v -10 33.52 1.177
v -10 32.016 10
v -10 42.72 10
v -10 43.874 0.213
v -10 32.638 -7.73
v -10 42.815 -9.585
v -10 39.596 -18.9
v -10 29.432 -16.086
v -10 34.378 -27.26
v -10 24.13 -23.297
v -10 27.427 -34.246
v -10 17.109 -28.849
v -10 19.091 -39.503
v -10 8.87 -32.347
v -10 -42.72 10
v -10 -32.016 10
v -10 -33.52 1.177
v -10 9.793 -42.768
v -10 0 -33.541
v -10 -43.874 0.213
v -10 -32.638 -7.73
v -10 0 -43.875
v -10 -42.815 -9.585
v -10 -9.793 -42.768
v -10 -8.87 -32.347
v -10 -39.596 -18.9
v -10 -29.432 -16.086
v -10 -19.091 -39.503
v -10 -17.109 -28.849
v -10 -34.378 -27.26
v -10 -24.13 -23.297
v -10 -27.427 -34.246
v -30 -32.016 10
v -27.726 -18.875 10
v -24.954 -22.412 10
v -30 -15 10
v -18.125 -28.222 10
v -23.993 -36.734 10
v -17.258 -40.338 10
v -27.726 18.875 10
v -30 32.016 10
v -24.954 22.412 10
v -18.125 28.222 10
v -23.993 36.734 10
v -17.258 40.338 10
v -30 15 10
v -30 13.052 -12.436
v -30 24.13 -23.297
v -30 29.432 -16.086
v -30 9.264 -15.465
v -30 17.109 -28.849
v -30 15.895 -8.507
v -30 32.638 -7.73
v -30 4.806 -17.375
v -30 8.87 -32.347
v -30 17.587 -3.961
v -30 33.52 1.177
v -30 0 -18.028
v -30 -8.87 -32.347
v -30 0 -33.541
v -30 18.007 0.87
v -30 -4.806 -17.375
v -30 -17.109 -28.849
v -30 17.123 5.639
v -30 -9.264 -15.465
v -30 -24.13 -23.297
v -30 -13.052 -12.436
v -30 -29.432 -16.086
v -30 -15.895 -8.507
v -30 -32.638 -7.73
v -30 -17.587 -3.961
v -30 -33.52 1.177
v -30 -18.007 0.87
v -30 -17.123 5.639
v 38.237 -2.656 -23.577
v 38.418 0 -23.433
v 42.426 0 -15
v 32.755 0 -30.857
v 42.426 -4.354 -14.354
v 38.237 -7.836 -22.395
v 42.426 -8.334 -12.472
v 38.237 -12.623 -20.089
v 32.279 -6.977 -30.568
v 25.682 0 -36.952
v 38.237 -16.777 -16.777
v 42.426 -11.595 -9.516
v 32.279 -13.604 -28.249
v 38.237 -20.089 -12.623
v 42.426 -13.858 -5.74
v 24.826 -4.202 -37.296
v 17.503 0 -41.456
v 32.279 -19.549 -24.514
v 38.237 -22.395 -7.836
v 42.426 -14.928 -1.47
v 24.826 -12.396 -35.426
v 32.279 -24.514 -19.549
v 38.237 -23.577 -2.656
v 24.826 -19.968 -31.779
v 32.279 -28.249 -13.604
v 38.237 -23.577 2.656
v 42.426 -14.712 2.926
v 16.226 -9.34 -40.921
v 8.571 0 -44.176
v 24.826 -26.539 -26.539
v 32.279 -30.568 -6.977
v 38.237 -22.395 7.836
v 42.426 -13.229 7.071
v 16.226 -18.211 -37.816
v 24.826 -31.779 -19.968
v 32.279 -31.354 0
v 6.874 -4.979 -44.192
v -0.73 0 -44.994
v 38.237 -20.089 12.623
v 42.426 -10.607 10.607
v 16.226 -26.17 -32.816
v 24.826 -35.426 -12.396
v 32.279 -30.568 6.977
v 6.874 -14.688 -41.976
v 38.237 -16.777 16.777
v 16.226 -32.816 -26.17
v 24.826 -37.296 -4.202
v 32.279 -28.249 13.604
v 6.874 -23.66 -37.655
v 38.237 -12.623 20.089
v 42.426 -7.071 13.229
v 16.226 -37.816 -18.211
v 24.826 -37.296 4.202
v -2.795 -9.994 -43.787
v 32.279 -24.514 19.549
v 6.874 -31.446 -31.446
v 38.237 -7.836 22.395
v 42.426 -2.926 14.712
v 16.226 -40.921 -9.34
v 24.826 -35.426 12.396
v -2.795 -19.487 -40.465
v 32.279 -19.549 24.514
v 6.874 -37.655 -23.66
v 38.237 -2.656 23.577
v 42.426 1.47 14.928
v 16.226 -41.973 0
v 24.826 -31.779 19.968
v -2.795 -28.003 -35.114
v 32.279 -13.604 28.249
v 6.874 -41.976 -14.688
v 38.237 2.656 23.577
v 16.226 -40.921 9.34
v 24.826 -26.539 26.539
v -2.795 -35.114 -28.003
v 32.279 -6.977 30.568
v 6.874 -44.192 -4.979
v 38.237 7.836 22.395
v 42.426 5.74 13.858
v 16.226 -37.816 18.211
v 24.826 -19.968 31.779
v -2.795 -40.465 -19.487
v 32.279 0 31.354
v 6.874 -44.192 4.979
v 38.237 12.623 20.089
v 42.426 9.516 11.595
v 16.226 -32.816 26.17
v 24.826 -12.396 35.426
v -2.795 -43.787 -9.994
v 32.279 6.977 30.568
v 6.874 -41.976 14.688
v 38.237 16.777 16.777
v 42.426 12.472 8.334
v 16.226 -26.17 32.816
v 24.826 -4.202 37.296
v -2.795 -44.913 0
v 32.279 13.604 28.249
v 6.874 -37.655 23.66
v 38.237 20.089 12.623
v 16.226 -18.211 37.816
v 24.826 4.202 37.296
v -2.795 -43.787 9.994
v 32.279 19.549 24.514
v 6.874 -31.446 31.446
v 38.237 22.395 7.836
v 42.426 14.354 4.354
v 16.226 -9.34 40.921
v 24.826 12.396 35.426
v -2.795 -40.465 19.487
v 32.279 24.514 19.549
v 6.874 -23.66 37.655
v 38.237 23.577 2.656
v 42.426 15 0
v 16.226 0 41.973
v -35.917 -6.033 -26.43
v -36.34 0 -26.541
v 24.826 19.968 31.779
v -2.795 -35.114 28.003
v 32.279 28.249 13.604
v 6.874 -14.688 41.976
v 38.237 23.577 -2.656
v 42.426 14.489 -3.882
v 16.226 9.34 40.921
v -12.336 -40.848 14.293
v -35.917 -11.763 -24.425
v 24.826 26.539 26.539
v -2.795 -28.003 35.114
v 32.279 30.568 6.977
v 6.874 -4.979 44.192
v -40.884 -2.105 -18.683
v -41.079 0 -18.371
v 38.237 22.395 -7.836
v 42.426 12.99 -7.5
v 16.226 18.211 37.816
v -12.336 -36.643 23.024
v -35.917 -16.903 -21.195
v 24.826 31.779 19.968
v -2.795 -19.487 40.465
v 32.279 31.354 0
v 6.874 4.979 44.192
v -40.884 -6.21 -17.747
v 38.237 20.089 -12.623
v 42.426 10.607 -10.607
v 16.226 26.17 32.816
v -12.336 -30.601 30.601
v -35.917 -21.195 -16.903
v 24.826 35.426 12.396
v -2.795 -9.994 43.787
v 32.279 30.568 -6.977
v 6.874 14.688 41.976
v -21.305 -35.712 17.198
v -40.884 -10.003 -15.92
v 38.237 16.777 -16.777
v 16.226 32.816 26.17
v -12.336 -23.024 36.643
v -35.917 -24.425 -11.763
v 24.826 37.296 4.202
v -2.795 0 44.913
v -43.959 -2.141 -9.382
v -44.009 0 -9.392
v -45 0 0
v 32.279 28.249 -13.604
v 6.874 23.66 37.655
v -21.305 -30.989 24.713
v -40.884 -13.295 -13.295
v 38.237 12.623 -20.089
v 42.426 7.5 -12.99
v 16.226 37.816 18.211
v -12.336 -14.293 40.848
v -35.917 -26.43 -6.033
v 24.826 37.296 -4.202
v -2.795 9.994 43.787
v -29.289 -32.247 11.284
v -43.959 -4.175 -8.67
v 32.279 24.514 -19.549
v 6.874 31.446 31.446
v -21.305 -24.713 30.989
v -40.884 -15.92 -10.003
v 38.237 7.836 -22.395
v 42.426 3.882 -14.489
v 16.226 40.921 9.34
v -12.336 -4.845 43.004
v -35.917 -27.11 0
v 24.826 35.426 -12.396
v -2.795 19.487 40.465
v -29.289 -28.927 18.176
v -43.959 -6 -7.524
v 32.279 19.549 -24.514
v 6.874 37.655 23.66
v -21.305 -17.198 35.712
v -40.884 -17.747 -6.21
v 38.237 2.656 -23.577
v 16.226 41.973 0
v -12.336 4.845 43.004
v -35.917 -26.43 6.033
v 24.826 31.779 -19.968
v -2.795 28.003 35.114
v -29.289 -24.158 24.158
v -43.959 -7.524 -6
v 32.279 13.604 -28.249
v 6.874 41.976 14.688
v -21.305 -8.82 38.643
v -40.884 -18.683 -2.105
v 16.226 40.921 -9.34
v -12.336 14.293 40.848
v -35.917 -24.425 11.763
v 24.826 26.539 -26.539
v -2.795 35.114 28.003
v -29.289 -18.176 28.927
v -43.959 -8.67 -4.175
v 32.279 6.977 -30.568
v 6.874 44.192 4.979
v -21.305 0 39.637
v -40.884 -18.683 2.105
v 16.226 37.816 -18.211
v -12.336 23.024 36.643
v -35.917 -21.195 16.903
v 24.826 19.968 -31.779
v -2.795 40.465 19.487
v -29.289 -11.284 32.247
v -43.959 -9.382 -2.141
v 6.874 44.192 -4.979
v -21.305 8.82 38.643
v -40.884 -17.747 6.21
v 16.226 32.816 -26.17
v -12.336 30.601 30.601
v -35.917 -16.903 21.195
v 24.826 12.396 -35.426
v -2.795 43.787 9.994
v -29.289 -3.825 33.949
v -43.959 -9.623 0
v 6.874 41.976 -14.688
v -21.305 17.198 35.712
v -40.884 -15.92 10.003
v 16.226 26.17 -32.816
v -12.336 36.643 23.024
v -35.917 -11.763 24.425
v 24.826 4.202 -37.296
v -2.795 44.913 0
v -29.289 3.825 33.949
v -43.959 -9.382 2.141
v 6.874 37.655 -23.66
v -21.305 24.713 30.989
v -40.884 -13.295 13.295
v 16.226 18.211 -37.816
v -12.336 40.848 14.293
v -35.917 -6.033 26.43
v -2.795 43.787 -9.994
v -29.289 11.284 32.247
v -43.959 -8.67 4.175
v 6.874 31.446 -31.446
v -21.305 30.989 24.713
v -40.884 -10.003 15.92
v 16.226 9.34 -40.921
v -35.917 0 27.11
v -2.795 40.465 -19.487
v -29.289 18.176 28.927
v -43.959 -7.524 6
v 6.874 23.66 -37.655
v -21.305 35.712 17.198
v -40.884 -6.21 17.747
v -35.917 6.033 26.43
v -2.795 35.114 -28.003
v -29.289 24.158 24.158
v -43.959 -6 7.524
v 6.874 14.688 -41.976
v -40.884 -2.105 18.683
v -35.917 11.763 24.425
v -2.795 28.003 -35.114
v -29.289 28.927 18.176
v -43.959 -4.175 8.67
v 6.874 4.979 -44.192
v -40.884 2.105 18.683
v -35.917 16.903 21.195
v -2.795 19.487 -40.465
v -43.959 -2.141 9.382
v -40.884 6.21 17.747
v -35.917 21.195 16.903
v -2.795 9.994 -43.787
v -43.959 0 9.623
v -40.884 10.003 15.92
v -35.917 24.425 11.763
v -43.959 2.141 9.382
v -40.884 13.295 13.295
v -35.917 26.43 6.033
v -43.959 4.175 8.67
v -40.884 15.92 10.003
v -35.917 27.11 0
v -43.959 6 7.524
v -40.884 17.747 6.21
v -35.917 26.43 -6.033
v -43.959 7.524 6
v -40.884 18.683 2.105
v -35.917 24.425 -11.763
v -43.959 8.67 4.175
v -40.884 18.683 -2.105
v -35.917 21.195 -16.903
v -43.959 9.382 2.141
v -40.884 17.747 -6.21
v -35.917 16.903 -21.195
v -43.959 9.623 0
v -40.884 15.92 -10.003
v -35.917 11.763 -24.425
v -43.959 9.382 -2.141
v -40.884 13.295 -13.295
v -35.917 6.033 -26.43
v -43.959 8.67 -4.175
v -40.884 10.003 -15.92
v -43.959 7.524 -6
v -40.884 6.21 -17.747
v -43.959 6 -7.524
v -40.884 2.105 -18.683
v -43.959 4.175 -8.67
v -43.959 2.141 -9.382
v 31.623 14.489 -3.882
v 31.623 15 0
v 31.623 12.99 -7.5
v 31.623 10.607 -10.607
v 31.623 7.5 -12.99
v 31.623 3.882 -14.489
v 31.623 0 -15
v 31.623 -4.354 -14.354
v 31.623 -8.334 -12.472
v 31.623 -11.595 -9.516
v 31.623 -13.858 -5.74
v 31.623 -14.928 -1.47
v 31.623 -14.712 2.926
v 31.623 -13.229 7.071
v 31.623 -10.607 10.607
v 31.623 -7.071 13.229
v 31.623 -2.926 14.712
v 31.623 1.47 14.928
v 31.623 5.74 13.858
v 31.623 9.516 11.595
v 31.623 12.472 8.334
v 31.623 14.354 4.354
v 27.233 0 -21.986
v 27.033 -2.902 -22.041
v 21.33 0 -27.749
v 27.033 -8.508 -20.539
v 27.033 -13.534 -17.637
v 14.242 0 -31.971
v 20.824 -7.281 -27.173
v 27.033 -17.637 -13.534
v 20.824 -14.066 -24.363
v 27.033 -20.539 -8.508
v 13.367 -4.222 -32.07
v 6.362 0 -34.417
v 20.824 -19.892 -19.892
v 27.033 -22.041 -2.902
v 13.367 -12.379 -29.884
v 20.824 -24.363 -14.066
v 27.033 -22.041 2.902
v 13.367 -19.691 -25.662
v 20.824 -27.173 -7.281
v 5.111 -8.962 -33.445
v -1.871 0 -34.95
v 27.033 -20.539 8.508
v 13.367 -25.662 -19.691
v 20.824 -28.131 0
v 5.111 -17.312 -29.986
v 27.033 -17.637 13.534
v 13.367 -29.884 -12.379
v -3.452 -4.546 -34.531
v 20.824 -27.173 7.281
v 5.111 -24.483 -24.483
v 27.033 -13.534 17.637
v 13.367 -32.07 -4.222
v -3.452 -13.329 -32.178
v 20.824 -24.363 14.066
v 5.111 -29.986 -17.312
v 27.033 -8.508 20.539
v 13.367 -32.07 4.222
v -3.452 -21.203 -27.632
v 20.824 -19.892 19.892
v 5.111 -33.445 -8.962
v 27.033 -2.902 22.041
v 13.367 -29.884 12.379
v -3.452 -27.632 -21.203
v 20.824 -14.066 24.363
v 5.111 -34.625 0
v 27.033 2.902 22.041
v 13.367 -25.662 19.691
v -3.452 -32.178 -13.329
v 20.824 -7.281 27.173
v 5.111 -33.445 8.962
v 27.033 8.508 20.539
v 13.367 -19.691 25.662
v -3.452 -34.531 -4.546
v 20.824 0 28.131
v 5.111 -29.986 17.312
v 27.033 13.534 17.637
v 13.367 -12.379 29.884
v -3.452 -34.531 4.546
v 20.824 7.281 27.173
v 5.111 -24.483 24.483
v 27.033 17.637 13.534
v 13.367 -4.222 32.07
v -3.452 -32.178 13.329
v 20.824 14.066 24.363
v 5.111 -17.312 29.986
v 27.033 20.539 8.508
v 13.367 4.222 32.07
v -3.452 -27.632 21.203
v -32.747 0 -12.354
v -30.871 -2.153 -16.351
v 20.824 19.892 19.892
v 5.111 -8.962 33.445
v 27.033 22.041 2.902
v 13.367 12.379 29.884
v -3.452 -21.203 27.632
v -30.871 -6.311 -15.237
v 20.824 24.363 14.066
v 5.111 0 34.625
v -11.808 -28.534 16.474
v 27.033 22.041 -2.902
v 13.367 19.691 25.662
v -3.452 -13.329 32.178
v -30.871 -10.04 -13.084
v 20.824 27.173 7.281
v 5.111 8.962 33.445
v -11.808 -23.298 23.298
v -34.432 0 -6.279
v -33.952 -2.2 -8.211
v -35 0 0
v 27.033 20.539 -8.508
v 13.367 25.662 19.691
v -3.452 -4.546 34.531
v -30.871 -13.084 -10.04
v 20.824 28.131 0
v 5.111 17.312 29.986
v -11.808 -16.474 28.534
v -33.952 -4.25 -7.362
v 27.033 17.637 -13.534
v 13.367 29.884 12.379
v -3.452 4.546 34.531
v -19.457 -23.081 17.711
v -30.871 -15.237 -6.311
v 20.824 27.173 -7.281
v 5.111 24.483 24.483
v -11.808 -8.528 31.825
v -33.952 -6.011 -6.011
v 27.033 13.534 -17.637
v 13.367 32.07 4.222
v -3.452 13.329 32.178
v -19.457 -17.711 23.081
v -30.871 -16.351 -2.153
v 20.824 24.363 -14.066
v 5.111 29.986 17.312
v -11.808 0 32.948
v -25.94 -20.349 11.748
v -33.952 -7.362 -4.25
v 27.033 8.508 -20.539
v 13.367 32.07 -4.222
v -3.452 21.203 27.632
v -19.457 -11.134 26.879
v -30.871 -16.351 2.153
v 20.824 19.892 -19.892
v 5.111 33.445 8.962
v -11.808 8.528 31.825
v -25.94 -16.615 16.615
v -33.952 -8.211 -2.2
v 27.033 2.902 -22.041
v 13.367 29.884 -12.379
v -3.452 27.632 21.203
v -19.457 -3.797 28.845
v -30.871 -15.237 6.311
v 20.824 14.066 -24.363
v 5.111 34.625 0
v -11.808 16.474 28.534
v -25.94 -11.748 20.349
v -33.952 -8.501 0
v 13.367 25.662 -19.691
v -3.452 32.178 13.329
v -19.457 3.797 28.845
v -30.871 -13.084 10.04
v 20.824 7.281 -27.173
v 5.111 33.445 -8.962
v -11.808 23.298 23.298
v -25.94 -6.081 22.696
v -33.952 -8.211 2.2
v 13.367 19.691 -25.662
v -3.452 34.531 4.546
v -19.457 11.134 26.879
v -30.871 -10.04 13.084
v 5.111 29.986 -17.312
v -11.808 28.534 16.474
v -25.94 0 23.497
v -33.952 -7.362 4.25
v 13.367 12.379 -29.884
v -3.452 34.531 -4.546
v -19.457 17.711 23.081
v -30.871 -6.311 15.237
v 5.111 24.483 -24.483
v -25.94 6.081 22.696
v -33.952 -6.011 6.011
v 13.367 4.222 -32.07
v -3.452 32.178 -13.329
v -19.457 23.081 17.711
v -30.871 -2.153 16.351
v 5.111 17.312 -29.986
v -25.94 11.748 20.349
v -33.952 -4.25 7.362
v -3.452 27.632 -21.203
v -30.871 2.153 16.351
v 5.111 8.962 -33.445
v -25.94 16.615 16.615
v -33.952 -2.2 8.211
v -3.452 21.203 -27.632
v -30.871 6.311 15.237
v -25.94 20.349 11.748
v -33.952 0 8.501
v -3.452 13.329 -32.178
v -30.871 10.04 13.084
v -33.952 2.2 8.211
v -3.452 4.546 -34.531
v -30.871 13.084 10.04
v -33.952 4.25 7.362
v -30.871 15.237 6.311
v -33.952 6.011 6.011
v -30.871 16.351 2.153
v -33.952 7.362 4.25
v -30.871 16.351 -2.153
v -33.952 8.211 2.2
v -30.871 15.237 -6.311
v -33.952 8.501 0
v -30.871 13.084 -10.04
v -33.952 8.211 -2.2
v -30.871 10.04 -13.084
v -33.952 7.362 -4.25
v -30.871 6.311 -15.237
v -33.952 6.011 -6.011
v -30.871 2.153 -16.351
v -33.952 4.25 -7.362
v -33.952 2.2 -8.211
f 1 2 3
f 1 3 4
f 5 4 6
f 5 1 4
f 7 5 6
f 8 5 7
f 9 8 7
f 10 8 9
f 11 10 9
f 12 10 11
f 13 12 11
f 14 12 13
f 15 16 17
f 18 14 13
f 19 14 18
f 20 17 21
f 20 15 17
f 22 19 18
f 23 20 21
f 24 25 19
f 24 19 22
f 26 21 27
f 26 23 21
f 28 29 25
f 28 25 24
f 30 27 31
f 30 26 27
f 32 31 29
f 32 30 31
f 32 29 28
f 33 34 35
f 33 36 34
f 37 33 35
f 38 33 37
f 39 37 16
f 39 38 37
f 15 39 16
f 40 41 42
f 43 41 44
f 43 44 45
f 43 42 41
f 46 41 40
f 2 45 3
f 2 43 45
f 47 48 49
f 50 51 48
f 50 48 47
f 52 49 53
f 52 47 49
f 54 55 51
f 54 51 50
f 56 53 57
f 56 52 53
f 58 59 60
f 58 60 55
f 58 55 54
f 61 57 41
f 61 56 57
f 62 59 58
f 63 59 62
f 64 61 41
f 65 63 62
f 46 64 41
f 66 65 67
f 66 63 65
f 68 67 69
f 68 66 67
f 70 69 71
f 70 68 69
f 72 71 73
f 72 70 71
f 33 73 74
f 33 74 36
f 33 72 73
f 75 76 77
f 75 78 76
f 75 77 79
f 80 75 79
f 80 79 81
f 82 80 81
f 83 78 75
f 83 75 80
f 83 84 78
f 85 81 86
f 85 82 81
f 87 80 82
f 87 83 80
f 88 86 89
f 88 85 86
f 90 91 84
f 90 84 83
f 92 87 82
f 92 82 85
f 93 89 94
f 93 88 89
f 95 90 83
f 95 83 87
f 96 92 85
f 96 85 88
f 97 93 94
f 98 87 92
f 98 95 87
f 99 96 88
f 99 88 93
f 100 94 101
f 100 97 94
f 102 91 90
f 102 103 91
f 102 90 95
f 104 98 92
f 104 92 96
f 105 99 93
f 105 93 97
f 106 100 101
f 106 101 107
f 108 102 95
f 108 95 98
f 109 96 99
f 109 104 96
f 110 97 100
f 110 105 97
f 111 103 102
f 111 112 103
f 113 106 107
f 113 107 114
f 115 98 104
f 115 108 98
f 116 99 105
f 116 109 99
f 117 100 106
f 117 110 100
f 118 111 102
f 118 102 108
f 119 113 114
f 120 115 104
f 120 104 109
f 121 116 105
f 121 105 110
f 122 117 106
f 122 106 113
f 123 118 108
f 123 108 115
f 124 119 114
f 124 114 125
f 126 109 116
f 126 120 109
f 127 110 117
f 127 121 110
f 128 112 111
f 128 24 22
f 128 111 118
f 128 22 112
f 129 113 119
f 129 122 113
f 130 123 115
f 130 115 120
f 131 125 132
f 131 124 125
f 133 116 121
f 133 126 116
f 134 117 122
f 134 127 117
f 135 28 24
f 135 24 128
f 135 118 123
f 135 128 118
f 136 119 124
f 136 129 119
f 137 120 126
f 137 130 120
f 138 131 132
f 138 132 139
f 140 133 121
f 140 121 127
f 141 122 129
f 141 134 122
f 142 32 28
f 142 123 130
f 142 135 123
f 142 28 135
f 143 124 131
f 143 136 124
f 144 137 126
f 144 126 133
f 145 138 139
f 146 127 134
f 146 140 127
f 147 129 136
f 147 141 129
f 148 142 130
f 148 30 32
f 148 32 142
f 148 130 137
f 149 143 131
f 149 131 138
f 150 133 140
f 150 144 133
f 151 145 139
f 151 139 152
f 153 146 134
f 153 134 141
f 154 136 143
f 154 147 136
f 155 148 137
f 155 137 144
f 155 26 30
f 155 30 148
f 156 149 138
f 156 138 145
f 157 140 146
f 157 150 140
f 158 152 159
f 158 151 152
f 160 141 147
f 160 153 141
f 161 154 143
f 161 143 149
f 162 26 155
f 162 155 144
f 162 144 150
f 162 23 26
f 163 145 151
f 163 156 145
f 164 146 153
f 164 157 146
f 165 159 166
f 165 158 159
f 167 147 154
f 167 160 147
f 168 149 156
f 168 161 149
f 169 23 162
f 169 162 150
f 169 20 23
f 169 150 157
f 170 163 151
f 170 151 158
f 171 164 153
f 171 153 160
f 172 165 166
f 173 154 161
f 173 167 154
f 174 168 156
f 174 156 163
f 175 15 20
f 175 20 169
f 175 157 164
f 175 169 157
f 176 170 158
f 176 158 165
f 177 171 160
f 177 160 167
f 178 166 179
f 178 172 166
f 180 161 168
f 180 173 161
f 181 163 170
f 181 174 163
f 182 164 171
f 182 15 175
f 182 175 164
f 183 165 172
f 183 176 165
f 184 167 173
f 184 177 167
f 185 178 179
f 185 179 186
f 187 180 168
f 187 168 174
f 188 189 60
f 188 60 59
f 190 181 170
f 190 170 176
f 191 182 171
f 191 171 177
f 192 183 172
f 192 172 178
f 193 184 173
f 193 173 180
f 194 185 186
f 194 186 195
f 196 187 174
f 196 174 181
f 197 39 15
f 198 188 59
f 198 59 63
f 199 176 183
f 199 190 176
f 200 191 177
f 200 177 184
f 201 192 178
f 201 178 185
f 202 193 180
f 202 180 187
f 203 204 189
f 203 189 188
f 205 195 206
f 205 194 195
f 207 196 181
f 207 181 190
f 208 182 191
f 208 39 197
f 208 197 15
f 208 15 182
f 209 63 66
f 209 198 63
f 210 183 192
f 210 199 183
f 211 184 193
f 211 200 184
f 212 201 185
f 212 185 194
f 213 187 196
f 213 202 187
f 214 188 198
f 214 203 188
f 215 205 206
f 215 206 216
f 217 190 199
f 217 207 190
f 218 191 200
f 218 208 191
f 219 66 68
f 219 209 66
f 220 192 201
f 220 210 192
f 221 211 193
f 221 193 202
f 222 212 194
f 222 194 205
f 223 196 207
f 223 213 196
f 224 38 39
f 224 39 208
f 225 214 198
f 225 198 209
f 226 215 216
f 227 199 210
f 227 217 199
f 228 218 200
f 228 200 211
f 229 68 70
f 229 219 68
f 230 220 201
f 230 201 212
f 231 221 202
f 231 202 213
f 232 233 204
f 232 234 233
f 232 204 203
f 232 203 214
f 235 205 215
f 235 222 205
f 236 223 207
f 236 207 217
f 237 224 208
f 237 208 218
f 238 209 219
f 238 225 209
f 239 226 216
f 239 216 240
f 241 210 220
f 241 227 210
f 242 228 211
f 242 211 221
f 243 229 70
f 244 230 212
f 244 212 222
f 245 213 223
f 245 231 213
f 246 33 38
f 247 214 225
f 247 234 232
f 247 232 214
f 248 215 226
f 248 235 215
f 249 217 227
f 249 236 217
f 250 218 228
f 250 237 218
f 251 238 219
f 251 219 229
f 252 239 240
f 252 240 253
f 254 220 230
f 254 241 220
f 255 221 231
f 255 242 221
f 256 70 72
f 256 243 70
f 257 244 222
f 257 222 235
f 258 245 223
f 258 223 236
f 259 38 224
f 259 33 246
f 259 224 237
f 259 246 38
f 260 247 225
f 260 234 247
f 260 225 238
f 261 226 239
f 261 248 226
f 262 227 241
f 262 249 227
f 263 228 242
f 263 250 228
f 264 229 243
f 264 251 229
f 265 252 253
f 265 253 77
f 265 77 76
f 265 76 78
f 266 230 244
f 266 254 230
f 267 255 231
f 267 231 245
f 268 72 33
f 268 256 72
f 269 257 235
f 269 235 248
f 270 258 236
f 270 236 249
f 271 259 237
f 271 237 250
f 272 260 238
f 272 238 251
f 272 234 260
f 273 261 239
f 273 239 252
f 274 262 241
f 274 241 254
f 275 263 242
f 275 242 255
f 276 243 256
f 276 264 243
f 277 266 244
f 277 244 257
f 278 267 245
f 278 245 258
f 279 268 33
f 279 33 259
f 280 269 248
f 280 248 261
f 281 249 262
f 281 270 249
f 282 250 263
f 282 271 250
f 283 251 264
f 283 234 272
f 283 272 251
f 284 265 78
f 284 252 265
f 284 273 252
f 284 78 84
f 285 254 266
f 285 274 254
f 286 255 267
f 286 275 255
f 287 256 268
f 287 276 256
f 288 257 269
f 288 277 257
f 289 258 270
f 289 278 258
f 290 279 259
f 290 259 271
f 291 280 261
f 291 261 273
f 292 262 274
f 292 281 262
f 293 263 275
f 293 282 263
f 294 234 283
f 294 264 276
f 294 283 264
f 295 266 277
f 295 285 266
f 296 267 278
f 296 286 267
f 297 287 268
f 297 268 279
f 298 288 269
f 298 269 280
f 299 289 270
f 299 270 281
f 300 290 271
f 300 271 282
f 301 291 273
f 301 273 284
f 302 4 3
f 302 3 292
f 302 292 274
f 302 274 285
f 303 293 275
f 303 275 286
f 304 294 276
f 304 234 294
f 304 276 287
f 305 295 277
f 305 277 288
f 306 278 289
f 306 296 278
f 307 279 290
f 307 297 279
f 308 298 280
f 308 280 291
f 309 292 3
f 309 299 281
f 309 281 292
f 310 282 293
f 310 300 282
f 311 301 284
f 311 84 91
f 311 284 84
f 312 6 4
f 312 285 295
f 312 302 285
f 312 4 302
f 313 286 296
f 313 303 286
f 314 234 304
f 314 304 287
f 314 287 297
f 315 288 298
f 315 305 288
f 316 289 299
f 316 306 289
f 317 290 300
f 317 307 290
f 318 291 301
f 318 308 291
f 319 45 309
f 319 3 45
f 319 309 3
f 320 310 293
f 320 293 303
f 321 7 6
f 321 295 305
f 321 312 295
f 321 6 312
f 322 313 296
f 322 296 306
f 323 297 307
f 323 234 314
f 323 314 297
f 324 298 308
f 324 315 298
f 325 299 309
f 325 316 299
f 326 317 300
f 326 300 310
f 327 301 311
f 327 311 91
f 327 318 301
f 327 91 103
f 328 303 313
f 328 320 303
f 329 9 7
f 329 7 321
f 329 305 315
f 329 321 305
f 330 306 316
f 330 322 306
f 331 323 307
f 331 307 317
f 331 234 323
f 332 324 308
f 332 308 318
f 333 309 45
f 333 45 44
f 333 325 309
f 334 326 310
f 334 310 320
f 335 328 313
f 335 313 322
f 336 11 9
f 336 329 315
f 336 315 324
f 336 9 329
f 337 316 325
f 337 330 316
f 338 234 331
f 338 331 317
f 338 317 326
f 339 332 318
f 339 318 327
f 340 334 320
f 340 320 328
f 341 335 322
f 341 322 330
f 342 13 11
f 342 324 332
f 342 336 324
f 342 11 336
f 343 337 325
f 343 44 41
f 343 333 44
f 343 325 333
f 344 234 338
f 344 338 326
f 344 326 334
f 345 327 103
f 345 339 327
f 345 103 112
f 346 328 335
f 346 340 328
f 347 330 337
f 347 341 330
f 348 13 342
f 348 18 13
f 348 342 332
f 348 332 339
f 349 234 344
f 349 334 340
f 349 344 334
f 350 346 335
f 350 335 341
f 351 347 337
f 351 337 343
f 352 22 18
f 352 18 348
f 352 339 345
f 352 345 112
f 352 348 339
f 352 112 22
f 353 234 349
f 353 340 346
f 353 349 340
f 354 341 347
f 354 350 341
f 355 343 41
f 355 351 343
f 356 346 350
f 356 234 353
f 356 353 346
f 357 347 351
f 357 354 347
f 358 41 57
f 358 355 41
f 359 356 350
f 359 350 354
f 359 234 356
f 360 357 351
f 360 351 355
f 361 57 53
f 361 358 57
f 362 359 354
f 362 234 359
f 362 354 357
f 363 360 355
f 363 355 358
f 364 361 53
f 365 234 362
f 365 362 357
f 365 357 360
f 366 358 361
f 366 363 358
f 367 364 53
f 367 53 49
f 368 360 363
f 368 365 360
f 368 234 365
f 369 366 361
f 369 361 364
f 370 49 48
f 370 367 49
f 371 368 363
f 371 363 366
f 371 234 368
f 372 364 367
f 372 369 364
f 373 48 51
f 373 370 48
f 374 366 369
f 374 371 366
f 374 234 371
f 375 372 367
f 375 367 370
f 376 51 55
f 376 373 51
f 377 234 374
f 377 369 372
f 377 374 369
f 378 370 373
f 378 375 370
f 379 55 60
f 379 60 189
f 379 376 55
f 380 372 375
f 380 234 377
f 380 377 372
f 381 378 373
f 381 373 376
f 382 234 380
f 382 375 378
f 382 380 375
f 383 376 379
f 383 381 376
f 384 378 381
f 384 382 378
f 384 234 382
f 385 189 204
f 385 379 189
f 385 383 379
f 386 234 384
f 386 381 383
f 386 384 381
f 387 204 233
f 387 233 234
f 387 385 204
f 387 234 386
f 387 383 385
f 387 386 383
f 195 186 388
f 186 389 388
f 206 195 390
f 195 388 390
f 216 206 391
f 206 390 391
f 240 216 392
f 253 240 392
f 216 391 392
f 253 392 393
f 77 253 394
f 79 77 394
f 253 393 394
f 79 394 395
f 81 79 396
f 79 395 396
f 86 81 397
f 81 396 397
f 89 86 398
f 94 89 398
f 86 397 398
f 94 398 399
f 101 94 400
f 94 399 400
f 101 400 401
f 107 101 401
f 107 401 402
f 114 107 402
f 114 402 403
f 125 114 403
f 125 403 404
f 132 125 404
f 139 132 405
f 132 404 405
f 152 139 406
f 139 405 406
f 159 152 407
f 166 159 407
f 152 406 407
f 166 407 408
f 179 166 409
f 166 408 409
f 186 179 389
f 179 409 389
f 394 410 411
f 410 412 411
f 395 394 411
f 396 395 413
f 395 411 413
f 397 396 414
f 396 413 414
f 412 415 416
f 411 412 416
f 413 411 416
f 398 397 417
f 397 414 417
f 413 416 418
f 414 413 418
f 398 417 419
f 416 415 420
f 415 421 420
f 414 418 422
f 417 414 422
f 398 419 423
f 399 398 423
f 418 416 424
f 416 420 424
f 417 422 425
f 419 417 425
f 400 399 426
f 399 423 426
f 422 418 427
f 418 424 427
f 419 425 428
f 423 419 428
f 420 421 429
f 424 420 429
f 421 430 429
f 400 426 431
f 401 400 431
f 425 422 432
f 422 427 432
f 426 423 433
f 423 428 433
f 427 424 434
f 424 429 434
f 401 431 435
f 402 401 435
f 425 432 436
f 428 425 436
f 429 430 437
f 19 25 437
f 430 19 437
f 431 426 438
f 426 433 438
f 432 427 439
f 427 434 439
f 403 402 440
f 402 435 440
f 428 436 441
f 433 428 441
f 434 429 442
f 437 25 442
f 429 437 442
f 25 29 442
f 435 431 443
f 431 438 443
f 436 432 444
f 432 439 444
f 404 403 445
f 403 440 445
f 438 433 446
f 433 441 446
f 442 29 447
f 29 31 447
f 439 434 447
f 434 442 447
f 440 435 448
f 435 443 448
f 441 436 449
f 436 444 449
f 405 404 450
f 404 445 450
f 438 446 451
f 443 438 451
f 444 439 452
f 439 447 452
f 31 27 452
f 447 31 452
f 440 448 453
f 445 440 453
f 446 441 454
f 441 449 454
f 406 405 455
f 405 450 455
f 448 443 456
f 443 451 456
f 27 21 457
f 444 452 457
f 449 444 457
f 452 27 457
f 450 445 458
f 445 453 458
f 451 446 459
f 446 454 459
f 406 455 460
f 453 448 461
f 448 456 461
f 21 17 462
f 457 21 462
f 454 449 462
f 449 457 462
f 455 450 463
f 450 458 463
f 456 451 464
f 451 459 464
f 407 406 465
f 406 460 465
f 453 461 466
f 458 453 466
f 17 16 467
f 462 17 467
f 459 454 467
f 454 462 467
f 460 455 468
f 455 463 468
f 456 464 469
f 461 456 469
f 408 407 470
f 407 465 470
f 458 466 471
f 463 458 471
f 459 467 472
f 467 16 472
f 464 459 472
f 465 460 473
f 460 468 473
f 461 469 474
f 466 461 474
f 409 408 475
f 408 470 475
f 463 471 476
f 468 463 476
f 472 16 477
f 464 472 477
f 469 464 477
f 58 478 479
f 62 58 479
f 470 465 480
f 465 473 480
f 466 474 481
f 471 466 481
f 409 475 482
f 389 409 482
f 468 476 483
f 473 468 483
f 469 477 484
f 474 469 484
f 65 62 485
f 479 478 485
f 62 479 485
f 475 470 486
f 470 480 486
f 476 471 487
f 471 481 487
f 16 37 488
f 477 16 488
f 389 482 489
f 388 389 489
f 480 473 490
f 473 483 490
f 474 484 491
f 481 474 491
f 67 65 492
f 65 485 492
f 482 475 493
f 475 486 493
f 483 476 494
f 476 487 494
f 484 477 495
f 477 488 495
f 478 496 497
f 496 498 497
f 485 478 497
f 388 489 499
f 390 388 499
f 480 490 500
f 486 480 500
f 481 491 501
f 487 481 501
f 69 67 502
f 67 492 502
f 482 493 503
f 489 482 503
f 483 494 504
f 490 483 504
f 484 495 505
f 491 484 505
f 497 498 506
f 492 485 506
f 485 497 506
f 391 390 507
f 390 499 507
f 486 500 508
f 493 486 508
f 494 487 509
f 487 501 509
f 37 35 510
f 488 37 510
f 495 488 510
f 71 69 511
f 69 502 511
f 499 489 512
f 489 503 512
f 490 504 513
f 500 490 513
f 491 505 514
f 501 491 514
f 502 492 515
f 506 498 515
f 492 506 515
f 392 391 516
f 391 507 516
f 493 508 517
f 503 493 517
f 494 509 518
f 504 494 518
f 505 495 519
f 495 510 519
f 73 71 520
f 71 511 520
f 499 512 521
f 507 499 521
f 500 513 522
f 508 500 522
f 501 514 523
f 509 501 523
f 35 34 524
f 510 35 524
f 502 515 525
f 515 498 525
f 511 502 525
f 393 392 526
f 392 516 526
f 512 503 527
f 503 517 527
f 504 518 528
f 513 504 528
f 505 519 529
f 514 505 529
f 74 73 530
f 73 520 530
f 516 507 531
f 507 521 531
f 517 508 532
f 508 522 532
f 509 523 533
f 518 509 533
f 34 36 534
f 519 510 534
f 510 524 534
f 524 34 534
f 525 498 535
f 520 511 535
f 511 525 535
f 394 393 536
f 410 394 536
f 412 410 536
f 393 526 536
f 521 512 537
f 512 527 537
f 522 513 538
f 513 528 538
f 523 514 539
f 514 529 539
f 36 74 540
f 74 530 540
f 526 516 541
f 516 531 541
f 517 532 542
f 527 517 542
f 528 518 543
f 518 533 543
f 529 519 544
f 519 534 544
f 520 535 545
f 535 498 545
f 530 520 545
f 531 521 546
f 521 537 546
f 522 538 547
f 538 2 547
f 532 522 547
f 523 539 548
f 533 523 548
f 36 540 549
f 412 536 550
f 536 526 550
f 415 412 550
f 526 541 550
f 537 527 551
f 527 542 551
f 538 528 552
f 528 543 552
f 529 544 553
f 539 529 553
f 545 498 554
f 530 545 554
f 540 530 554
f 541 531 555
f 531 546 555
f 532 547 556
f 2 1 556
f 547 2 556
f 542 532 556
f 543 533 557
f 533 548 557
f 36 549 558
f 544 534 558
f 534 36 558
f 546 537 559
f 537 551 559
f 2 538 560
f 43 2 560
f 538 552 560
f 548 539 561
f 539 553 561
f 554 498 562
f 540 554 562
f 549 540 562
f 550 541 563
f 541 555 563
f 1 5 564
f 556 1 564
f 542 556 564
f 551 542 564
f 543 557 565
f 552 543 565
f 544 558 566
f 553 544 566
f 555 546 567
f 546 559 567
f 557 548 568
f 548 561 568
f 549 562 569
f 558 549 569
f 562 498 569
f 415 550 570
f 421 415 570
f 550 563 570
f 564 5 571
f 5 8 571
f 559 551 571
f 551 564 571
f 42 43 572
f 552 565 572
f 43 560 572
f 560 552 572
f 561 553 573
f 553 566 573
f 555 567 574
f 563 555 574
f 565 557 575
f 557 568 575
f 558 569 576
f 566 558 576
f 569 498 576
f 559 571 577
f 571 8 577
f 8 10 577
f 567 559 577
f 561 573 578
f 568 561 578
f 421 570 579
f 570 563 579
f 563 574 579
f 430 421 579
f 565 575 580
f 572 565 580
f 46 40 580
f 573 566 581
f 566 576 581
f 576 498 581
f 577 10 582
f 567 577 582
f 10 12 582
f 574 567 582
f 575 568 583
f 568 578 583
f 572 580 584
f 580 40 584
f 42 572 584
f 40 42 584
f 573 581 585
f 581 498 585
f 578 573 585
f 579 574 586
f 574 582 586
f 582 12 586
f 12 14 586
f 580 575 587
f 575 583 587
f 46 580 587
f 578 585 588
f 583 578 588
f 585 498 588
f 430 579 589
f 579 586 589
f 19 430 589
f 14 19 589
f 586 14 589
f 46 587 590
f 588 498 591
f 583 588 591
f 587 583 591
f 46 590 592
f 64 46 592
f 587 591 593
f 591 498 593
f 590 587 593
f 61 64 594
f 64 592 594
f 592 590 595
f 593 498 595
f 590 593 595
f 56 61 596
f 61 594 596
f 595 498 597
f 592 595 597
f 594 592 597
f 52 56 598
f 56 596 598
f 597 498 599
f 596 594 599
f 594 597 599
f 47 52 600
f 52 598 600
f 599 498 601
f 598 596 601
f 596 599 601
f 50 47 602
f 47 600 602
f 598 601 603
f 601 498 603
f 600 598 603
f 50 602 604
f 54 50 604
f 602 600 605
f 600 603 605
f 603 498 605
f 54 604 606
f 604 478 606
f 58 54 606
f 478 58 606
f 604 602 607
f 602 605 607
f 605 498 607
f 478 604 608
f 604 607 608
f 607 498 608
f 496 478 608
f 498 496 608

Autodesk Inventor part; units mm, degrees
ref_plane "YZ Plane" through (0, 0, 0) normal (1, 0, 0) x (0, 1, 0)
ref_plane "XZ Plane" through (0, 0, 0) normal (0, 1, 0) x (-1, 0, 0)
ref_plane "XY Plane" through (0, 0, 0) normal (0, 0, 1) x (1, 0, 0)
sketch "Эскиз1" plane through (0, 0, 0) normal (0, 1, 0) x (-1, 0, 0)
  arc A0 (-45, 0) -> (45, 0) centre (0, 0) ccw
  arc A1 (-35, 0) -> (35, 0) centre (0, 0) ccw
  line L0 (45, 0) -> (35, 0)
  line L1 (-35, 0) -> (-45, 0)
  line L2 (63, 0) -> (-63, 0) projected
  dimension "d0" = 45
  dimension "d1" = 35
revolve "Вращение1" add sketch "Эскиз1" angle 360 about axis through (-10, 0, 0) along (1, 0, 0) contours L1 A1 L0 A0
sketch "Эскиз2" plane through (0, 0, 0) normal (0, 1, 0) x (-1, 0, 0)
  line L0 (30, 10) -> (10, 10)
  line L1 (10, 10) -> (10, -45)
  line L2 (10, -45) -> (30, -45)
  line L3 (30, -45) -> (30, 10)
  line L4 (0, -87.9025) -> (0, 67.1504) projected
  line L5 (63, 0) -> (-63, 0) projected
  circle A0 centre (0, 0) radius 45 projected
  dimension "d3" = 10
  dimension "d4" = 20
  dimension "d5" = 10
extrude "Выдавливание1" cut sketch "Эскиз2" along normal through all both and the other way through all contours L3 L5 L1 L0 | L3 A0 L1 L5 | L3 L2 L1 A0
sketch "Эскиз3" plane through (0, 0, 0) normal (1, 0, 0) x (0, 1, 0)
  circle A0 centre (0, 0) radius 15
  dimension "d8" = 30
extrude "Выдавливание2" cut sketch "Эскиз3" along normal through all
properties part number "Пирамида"
